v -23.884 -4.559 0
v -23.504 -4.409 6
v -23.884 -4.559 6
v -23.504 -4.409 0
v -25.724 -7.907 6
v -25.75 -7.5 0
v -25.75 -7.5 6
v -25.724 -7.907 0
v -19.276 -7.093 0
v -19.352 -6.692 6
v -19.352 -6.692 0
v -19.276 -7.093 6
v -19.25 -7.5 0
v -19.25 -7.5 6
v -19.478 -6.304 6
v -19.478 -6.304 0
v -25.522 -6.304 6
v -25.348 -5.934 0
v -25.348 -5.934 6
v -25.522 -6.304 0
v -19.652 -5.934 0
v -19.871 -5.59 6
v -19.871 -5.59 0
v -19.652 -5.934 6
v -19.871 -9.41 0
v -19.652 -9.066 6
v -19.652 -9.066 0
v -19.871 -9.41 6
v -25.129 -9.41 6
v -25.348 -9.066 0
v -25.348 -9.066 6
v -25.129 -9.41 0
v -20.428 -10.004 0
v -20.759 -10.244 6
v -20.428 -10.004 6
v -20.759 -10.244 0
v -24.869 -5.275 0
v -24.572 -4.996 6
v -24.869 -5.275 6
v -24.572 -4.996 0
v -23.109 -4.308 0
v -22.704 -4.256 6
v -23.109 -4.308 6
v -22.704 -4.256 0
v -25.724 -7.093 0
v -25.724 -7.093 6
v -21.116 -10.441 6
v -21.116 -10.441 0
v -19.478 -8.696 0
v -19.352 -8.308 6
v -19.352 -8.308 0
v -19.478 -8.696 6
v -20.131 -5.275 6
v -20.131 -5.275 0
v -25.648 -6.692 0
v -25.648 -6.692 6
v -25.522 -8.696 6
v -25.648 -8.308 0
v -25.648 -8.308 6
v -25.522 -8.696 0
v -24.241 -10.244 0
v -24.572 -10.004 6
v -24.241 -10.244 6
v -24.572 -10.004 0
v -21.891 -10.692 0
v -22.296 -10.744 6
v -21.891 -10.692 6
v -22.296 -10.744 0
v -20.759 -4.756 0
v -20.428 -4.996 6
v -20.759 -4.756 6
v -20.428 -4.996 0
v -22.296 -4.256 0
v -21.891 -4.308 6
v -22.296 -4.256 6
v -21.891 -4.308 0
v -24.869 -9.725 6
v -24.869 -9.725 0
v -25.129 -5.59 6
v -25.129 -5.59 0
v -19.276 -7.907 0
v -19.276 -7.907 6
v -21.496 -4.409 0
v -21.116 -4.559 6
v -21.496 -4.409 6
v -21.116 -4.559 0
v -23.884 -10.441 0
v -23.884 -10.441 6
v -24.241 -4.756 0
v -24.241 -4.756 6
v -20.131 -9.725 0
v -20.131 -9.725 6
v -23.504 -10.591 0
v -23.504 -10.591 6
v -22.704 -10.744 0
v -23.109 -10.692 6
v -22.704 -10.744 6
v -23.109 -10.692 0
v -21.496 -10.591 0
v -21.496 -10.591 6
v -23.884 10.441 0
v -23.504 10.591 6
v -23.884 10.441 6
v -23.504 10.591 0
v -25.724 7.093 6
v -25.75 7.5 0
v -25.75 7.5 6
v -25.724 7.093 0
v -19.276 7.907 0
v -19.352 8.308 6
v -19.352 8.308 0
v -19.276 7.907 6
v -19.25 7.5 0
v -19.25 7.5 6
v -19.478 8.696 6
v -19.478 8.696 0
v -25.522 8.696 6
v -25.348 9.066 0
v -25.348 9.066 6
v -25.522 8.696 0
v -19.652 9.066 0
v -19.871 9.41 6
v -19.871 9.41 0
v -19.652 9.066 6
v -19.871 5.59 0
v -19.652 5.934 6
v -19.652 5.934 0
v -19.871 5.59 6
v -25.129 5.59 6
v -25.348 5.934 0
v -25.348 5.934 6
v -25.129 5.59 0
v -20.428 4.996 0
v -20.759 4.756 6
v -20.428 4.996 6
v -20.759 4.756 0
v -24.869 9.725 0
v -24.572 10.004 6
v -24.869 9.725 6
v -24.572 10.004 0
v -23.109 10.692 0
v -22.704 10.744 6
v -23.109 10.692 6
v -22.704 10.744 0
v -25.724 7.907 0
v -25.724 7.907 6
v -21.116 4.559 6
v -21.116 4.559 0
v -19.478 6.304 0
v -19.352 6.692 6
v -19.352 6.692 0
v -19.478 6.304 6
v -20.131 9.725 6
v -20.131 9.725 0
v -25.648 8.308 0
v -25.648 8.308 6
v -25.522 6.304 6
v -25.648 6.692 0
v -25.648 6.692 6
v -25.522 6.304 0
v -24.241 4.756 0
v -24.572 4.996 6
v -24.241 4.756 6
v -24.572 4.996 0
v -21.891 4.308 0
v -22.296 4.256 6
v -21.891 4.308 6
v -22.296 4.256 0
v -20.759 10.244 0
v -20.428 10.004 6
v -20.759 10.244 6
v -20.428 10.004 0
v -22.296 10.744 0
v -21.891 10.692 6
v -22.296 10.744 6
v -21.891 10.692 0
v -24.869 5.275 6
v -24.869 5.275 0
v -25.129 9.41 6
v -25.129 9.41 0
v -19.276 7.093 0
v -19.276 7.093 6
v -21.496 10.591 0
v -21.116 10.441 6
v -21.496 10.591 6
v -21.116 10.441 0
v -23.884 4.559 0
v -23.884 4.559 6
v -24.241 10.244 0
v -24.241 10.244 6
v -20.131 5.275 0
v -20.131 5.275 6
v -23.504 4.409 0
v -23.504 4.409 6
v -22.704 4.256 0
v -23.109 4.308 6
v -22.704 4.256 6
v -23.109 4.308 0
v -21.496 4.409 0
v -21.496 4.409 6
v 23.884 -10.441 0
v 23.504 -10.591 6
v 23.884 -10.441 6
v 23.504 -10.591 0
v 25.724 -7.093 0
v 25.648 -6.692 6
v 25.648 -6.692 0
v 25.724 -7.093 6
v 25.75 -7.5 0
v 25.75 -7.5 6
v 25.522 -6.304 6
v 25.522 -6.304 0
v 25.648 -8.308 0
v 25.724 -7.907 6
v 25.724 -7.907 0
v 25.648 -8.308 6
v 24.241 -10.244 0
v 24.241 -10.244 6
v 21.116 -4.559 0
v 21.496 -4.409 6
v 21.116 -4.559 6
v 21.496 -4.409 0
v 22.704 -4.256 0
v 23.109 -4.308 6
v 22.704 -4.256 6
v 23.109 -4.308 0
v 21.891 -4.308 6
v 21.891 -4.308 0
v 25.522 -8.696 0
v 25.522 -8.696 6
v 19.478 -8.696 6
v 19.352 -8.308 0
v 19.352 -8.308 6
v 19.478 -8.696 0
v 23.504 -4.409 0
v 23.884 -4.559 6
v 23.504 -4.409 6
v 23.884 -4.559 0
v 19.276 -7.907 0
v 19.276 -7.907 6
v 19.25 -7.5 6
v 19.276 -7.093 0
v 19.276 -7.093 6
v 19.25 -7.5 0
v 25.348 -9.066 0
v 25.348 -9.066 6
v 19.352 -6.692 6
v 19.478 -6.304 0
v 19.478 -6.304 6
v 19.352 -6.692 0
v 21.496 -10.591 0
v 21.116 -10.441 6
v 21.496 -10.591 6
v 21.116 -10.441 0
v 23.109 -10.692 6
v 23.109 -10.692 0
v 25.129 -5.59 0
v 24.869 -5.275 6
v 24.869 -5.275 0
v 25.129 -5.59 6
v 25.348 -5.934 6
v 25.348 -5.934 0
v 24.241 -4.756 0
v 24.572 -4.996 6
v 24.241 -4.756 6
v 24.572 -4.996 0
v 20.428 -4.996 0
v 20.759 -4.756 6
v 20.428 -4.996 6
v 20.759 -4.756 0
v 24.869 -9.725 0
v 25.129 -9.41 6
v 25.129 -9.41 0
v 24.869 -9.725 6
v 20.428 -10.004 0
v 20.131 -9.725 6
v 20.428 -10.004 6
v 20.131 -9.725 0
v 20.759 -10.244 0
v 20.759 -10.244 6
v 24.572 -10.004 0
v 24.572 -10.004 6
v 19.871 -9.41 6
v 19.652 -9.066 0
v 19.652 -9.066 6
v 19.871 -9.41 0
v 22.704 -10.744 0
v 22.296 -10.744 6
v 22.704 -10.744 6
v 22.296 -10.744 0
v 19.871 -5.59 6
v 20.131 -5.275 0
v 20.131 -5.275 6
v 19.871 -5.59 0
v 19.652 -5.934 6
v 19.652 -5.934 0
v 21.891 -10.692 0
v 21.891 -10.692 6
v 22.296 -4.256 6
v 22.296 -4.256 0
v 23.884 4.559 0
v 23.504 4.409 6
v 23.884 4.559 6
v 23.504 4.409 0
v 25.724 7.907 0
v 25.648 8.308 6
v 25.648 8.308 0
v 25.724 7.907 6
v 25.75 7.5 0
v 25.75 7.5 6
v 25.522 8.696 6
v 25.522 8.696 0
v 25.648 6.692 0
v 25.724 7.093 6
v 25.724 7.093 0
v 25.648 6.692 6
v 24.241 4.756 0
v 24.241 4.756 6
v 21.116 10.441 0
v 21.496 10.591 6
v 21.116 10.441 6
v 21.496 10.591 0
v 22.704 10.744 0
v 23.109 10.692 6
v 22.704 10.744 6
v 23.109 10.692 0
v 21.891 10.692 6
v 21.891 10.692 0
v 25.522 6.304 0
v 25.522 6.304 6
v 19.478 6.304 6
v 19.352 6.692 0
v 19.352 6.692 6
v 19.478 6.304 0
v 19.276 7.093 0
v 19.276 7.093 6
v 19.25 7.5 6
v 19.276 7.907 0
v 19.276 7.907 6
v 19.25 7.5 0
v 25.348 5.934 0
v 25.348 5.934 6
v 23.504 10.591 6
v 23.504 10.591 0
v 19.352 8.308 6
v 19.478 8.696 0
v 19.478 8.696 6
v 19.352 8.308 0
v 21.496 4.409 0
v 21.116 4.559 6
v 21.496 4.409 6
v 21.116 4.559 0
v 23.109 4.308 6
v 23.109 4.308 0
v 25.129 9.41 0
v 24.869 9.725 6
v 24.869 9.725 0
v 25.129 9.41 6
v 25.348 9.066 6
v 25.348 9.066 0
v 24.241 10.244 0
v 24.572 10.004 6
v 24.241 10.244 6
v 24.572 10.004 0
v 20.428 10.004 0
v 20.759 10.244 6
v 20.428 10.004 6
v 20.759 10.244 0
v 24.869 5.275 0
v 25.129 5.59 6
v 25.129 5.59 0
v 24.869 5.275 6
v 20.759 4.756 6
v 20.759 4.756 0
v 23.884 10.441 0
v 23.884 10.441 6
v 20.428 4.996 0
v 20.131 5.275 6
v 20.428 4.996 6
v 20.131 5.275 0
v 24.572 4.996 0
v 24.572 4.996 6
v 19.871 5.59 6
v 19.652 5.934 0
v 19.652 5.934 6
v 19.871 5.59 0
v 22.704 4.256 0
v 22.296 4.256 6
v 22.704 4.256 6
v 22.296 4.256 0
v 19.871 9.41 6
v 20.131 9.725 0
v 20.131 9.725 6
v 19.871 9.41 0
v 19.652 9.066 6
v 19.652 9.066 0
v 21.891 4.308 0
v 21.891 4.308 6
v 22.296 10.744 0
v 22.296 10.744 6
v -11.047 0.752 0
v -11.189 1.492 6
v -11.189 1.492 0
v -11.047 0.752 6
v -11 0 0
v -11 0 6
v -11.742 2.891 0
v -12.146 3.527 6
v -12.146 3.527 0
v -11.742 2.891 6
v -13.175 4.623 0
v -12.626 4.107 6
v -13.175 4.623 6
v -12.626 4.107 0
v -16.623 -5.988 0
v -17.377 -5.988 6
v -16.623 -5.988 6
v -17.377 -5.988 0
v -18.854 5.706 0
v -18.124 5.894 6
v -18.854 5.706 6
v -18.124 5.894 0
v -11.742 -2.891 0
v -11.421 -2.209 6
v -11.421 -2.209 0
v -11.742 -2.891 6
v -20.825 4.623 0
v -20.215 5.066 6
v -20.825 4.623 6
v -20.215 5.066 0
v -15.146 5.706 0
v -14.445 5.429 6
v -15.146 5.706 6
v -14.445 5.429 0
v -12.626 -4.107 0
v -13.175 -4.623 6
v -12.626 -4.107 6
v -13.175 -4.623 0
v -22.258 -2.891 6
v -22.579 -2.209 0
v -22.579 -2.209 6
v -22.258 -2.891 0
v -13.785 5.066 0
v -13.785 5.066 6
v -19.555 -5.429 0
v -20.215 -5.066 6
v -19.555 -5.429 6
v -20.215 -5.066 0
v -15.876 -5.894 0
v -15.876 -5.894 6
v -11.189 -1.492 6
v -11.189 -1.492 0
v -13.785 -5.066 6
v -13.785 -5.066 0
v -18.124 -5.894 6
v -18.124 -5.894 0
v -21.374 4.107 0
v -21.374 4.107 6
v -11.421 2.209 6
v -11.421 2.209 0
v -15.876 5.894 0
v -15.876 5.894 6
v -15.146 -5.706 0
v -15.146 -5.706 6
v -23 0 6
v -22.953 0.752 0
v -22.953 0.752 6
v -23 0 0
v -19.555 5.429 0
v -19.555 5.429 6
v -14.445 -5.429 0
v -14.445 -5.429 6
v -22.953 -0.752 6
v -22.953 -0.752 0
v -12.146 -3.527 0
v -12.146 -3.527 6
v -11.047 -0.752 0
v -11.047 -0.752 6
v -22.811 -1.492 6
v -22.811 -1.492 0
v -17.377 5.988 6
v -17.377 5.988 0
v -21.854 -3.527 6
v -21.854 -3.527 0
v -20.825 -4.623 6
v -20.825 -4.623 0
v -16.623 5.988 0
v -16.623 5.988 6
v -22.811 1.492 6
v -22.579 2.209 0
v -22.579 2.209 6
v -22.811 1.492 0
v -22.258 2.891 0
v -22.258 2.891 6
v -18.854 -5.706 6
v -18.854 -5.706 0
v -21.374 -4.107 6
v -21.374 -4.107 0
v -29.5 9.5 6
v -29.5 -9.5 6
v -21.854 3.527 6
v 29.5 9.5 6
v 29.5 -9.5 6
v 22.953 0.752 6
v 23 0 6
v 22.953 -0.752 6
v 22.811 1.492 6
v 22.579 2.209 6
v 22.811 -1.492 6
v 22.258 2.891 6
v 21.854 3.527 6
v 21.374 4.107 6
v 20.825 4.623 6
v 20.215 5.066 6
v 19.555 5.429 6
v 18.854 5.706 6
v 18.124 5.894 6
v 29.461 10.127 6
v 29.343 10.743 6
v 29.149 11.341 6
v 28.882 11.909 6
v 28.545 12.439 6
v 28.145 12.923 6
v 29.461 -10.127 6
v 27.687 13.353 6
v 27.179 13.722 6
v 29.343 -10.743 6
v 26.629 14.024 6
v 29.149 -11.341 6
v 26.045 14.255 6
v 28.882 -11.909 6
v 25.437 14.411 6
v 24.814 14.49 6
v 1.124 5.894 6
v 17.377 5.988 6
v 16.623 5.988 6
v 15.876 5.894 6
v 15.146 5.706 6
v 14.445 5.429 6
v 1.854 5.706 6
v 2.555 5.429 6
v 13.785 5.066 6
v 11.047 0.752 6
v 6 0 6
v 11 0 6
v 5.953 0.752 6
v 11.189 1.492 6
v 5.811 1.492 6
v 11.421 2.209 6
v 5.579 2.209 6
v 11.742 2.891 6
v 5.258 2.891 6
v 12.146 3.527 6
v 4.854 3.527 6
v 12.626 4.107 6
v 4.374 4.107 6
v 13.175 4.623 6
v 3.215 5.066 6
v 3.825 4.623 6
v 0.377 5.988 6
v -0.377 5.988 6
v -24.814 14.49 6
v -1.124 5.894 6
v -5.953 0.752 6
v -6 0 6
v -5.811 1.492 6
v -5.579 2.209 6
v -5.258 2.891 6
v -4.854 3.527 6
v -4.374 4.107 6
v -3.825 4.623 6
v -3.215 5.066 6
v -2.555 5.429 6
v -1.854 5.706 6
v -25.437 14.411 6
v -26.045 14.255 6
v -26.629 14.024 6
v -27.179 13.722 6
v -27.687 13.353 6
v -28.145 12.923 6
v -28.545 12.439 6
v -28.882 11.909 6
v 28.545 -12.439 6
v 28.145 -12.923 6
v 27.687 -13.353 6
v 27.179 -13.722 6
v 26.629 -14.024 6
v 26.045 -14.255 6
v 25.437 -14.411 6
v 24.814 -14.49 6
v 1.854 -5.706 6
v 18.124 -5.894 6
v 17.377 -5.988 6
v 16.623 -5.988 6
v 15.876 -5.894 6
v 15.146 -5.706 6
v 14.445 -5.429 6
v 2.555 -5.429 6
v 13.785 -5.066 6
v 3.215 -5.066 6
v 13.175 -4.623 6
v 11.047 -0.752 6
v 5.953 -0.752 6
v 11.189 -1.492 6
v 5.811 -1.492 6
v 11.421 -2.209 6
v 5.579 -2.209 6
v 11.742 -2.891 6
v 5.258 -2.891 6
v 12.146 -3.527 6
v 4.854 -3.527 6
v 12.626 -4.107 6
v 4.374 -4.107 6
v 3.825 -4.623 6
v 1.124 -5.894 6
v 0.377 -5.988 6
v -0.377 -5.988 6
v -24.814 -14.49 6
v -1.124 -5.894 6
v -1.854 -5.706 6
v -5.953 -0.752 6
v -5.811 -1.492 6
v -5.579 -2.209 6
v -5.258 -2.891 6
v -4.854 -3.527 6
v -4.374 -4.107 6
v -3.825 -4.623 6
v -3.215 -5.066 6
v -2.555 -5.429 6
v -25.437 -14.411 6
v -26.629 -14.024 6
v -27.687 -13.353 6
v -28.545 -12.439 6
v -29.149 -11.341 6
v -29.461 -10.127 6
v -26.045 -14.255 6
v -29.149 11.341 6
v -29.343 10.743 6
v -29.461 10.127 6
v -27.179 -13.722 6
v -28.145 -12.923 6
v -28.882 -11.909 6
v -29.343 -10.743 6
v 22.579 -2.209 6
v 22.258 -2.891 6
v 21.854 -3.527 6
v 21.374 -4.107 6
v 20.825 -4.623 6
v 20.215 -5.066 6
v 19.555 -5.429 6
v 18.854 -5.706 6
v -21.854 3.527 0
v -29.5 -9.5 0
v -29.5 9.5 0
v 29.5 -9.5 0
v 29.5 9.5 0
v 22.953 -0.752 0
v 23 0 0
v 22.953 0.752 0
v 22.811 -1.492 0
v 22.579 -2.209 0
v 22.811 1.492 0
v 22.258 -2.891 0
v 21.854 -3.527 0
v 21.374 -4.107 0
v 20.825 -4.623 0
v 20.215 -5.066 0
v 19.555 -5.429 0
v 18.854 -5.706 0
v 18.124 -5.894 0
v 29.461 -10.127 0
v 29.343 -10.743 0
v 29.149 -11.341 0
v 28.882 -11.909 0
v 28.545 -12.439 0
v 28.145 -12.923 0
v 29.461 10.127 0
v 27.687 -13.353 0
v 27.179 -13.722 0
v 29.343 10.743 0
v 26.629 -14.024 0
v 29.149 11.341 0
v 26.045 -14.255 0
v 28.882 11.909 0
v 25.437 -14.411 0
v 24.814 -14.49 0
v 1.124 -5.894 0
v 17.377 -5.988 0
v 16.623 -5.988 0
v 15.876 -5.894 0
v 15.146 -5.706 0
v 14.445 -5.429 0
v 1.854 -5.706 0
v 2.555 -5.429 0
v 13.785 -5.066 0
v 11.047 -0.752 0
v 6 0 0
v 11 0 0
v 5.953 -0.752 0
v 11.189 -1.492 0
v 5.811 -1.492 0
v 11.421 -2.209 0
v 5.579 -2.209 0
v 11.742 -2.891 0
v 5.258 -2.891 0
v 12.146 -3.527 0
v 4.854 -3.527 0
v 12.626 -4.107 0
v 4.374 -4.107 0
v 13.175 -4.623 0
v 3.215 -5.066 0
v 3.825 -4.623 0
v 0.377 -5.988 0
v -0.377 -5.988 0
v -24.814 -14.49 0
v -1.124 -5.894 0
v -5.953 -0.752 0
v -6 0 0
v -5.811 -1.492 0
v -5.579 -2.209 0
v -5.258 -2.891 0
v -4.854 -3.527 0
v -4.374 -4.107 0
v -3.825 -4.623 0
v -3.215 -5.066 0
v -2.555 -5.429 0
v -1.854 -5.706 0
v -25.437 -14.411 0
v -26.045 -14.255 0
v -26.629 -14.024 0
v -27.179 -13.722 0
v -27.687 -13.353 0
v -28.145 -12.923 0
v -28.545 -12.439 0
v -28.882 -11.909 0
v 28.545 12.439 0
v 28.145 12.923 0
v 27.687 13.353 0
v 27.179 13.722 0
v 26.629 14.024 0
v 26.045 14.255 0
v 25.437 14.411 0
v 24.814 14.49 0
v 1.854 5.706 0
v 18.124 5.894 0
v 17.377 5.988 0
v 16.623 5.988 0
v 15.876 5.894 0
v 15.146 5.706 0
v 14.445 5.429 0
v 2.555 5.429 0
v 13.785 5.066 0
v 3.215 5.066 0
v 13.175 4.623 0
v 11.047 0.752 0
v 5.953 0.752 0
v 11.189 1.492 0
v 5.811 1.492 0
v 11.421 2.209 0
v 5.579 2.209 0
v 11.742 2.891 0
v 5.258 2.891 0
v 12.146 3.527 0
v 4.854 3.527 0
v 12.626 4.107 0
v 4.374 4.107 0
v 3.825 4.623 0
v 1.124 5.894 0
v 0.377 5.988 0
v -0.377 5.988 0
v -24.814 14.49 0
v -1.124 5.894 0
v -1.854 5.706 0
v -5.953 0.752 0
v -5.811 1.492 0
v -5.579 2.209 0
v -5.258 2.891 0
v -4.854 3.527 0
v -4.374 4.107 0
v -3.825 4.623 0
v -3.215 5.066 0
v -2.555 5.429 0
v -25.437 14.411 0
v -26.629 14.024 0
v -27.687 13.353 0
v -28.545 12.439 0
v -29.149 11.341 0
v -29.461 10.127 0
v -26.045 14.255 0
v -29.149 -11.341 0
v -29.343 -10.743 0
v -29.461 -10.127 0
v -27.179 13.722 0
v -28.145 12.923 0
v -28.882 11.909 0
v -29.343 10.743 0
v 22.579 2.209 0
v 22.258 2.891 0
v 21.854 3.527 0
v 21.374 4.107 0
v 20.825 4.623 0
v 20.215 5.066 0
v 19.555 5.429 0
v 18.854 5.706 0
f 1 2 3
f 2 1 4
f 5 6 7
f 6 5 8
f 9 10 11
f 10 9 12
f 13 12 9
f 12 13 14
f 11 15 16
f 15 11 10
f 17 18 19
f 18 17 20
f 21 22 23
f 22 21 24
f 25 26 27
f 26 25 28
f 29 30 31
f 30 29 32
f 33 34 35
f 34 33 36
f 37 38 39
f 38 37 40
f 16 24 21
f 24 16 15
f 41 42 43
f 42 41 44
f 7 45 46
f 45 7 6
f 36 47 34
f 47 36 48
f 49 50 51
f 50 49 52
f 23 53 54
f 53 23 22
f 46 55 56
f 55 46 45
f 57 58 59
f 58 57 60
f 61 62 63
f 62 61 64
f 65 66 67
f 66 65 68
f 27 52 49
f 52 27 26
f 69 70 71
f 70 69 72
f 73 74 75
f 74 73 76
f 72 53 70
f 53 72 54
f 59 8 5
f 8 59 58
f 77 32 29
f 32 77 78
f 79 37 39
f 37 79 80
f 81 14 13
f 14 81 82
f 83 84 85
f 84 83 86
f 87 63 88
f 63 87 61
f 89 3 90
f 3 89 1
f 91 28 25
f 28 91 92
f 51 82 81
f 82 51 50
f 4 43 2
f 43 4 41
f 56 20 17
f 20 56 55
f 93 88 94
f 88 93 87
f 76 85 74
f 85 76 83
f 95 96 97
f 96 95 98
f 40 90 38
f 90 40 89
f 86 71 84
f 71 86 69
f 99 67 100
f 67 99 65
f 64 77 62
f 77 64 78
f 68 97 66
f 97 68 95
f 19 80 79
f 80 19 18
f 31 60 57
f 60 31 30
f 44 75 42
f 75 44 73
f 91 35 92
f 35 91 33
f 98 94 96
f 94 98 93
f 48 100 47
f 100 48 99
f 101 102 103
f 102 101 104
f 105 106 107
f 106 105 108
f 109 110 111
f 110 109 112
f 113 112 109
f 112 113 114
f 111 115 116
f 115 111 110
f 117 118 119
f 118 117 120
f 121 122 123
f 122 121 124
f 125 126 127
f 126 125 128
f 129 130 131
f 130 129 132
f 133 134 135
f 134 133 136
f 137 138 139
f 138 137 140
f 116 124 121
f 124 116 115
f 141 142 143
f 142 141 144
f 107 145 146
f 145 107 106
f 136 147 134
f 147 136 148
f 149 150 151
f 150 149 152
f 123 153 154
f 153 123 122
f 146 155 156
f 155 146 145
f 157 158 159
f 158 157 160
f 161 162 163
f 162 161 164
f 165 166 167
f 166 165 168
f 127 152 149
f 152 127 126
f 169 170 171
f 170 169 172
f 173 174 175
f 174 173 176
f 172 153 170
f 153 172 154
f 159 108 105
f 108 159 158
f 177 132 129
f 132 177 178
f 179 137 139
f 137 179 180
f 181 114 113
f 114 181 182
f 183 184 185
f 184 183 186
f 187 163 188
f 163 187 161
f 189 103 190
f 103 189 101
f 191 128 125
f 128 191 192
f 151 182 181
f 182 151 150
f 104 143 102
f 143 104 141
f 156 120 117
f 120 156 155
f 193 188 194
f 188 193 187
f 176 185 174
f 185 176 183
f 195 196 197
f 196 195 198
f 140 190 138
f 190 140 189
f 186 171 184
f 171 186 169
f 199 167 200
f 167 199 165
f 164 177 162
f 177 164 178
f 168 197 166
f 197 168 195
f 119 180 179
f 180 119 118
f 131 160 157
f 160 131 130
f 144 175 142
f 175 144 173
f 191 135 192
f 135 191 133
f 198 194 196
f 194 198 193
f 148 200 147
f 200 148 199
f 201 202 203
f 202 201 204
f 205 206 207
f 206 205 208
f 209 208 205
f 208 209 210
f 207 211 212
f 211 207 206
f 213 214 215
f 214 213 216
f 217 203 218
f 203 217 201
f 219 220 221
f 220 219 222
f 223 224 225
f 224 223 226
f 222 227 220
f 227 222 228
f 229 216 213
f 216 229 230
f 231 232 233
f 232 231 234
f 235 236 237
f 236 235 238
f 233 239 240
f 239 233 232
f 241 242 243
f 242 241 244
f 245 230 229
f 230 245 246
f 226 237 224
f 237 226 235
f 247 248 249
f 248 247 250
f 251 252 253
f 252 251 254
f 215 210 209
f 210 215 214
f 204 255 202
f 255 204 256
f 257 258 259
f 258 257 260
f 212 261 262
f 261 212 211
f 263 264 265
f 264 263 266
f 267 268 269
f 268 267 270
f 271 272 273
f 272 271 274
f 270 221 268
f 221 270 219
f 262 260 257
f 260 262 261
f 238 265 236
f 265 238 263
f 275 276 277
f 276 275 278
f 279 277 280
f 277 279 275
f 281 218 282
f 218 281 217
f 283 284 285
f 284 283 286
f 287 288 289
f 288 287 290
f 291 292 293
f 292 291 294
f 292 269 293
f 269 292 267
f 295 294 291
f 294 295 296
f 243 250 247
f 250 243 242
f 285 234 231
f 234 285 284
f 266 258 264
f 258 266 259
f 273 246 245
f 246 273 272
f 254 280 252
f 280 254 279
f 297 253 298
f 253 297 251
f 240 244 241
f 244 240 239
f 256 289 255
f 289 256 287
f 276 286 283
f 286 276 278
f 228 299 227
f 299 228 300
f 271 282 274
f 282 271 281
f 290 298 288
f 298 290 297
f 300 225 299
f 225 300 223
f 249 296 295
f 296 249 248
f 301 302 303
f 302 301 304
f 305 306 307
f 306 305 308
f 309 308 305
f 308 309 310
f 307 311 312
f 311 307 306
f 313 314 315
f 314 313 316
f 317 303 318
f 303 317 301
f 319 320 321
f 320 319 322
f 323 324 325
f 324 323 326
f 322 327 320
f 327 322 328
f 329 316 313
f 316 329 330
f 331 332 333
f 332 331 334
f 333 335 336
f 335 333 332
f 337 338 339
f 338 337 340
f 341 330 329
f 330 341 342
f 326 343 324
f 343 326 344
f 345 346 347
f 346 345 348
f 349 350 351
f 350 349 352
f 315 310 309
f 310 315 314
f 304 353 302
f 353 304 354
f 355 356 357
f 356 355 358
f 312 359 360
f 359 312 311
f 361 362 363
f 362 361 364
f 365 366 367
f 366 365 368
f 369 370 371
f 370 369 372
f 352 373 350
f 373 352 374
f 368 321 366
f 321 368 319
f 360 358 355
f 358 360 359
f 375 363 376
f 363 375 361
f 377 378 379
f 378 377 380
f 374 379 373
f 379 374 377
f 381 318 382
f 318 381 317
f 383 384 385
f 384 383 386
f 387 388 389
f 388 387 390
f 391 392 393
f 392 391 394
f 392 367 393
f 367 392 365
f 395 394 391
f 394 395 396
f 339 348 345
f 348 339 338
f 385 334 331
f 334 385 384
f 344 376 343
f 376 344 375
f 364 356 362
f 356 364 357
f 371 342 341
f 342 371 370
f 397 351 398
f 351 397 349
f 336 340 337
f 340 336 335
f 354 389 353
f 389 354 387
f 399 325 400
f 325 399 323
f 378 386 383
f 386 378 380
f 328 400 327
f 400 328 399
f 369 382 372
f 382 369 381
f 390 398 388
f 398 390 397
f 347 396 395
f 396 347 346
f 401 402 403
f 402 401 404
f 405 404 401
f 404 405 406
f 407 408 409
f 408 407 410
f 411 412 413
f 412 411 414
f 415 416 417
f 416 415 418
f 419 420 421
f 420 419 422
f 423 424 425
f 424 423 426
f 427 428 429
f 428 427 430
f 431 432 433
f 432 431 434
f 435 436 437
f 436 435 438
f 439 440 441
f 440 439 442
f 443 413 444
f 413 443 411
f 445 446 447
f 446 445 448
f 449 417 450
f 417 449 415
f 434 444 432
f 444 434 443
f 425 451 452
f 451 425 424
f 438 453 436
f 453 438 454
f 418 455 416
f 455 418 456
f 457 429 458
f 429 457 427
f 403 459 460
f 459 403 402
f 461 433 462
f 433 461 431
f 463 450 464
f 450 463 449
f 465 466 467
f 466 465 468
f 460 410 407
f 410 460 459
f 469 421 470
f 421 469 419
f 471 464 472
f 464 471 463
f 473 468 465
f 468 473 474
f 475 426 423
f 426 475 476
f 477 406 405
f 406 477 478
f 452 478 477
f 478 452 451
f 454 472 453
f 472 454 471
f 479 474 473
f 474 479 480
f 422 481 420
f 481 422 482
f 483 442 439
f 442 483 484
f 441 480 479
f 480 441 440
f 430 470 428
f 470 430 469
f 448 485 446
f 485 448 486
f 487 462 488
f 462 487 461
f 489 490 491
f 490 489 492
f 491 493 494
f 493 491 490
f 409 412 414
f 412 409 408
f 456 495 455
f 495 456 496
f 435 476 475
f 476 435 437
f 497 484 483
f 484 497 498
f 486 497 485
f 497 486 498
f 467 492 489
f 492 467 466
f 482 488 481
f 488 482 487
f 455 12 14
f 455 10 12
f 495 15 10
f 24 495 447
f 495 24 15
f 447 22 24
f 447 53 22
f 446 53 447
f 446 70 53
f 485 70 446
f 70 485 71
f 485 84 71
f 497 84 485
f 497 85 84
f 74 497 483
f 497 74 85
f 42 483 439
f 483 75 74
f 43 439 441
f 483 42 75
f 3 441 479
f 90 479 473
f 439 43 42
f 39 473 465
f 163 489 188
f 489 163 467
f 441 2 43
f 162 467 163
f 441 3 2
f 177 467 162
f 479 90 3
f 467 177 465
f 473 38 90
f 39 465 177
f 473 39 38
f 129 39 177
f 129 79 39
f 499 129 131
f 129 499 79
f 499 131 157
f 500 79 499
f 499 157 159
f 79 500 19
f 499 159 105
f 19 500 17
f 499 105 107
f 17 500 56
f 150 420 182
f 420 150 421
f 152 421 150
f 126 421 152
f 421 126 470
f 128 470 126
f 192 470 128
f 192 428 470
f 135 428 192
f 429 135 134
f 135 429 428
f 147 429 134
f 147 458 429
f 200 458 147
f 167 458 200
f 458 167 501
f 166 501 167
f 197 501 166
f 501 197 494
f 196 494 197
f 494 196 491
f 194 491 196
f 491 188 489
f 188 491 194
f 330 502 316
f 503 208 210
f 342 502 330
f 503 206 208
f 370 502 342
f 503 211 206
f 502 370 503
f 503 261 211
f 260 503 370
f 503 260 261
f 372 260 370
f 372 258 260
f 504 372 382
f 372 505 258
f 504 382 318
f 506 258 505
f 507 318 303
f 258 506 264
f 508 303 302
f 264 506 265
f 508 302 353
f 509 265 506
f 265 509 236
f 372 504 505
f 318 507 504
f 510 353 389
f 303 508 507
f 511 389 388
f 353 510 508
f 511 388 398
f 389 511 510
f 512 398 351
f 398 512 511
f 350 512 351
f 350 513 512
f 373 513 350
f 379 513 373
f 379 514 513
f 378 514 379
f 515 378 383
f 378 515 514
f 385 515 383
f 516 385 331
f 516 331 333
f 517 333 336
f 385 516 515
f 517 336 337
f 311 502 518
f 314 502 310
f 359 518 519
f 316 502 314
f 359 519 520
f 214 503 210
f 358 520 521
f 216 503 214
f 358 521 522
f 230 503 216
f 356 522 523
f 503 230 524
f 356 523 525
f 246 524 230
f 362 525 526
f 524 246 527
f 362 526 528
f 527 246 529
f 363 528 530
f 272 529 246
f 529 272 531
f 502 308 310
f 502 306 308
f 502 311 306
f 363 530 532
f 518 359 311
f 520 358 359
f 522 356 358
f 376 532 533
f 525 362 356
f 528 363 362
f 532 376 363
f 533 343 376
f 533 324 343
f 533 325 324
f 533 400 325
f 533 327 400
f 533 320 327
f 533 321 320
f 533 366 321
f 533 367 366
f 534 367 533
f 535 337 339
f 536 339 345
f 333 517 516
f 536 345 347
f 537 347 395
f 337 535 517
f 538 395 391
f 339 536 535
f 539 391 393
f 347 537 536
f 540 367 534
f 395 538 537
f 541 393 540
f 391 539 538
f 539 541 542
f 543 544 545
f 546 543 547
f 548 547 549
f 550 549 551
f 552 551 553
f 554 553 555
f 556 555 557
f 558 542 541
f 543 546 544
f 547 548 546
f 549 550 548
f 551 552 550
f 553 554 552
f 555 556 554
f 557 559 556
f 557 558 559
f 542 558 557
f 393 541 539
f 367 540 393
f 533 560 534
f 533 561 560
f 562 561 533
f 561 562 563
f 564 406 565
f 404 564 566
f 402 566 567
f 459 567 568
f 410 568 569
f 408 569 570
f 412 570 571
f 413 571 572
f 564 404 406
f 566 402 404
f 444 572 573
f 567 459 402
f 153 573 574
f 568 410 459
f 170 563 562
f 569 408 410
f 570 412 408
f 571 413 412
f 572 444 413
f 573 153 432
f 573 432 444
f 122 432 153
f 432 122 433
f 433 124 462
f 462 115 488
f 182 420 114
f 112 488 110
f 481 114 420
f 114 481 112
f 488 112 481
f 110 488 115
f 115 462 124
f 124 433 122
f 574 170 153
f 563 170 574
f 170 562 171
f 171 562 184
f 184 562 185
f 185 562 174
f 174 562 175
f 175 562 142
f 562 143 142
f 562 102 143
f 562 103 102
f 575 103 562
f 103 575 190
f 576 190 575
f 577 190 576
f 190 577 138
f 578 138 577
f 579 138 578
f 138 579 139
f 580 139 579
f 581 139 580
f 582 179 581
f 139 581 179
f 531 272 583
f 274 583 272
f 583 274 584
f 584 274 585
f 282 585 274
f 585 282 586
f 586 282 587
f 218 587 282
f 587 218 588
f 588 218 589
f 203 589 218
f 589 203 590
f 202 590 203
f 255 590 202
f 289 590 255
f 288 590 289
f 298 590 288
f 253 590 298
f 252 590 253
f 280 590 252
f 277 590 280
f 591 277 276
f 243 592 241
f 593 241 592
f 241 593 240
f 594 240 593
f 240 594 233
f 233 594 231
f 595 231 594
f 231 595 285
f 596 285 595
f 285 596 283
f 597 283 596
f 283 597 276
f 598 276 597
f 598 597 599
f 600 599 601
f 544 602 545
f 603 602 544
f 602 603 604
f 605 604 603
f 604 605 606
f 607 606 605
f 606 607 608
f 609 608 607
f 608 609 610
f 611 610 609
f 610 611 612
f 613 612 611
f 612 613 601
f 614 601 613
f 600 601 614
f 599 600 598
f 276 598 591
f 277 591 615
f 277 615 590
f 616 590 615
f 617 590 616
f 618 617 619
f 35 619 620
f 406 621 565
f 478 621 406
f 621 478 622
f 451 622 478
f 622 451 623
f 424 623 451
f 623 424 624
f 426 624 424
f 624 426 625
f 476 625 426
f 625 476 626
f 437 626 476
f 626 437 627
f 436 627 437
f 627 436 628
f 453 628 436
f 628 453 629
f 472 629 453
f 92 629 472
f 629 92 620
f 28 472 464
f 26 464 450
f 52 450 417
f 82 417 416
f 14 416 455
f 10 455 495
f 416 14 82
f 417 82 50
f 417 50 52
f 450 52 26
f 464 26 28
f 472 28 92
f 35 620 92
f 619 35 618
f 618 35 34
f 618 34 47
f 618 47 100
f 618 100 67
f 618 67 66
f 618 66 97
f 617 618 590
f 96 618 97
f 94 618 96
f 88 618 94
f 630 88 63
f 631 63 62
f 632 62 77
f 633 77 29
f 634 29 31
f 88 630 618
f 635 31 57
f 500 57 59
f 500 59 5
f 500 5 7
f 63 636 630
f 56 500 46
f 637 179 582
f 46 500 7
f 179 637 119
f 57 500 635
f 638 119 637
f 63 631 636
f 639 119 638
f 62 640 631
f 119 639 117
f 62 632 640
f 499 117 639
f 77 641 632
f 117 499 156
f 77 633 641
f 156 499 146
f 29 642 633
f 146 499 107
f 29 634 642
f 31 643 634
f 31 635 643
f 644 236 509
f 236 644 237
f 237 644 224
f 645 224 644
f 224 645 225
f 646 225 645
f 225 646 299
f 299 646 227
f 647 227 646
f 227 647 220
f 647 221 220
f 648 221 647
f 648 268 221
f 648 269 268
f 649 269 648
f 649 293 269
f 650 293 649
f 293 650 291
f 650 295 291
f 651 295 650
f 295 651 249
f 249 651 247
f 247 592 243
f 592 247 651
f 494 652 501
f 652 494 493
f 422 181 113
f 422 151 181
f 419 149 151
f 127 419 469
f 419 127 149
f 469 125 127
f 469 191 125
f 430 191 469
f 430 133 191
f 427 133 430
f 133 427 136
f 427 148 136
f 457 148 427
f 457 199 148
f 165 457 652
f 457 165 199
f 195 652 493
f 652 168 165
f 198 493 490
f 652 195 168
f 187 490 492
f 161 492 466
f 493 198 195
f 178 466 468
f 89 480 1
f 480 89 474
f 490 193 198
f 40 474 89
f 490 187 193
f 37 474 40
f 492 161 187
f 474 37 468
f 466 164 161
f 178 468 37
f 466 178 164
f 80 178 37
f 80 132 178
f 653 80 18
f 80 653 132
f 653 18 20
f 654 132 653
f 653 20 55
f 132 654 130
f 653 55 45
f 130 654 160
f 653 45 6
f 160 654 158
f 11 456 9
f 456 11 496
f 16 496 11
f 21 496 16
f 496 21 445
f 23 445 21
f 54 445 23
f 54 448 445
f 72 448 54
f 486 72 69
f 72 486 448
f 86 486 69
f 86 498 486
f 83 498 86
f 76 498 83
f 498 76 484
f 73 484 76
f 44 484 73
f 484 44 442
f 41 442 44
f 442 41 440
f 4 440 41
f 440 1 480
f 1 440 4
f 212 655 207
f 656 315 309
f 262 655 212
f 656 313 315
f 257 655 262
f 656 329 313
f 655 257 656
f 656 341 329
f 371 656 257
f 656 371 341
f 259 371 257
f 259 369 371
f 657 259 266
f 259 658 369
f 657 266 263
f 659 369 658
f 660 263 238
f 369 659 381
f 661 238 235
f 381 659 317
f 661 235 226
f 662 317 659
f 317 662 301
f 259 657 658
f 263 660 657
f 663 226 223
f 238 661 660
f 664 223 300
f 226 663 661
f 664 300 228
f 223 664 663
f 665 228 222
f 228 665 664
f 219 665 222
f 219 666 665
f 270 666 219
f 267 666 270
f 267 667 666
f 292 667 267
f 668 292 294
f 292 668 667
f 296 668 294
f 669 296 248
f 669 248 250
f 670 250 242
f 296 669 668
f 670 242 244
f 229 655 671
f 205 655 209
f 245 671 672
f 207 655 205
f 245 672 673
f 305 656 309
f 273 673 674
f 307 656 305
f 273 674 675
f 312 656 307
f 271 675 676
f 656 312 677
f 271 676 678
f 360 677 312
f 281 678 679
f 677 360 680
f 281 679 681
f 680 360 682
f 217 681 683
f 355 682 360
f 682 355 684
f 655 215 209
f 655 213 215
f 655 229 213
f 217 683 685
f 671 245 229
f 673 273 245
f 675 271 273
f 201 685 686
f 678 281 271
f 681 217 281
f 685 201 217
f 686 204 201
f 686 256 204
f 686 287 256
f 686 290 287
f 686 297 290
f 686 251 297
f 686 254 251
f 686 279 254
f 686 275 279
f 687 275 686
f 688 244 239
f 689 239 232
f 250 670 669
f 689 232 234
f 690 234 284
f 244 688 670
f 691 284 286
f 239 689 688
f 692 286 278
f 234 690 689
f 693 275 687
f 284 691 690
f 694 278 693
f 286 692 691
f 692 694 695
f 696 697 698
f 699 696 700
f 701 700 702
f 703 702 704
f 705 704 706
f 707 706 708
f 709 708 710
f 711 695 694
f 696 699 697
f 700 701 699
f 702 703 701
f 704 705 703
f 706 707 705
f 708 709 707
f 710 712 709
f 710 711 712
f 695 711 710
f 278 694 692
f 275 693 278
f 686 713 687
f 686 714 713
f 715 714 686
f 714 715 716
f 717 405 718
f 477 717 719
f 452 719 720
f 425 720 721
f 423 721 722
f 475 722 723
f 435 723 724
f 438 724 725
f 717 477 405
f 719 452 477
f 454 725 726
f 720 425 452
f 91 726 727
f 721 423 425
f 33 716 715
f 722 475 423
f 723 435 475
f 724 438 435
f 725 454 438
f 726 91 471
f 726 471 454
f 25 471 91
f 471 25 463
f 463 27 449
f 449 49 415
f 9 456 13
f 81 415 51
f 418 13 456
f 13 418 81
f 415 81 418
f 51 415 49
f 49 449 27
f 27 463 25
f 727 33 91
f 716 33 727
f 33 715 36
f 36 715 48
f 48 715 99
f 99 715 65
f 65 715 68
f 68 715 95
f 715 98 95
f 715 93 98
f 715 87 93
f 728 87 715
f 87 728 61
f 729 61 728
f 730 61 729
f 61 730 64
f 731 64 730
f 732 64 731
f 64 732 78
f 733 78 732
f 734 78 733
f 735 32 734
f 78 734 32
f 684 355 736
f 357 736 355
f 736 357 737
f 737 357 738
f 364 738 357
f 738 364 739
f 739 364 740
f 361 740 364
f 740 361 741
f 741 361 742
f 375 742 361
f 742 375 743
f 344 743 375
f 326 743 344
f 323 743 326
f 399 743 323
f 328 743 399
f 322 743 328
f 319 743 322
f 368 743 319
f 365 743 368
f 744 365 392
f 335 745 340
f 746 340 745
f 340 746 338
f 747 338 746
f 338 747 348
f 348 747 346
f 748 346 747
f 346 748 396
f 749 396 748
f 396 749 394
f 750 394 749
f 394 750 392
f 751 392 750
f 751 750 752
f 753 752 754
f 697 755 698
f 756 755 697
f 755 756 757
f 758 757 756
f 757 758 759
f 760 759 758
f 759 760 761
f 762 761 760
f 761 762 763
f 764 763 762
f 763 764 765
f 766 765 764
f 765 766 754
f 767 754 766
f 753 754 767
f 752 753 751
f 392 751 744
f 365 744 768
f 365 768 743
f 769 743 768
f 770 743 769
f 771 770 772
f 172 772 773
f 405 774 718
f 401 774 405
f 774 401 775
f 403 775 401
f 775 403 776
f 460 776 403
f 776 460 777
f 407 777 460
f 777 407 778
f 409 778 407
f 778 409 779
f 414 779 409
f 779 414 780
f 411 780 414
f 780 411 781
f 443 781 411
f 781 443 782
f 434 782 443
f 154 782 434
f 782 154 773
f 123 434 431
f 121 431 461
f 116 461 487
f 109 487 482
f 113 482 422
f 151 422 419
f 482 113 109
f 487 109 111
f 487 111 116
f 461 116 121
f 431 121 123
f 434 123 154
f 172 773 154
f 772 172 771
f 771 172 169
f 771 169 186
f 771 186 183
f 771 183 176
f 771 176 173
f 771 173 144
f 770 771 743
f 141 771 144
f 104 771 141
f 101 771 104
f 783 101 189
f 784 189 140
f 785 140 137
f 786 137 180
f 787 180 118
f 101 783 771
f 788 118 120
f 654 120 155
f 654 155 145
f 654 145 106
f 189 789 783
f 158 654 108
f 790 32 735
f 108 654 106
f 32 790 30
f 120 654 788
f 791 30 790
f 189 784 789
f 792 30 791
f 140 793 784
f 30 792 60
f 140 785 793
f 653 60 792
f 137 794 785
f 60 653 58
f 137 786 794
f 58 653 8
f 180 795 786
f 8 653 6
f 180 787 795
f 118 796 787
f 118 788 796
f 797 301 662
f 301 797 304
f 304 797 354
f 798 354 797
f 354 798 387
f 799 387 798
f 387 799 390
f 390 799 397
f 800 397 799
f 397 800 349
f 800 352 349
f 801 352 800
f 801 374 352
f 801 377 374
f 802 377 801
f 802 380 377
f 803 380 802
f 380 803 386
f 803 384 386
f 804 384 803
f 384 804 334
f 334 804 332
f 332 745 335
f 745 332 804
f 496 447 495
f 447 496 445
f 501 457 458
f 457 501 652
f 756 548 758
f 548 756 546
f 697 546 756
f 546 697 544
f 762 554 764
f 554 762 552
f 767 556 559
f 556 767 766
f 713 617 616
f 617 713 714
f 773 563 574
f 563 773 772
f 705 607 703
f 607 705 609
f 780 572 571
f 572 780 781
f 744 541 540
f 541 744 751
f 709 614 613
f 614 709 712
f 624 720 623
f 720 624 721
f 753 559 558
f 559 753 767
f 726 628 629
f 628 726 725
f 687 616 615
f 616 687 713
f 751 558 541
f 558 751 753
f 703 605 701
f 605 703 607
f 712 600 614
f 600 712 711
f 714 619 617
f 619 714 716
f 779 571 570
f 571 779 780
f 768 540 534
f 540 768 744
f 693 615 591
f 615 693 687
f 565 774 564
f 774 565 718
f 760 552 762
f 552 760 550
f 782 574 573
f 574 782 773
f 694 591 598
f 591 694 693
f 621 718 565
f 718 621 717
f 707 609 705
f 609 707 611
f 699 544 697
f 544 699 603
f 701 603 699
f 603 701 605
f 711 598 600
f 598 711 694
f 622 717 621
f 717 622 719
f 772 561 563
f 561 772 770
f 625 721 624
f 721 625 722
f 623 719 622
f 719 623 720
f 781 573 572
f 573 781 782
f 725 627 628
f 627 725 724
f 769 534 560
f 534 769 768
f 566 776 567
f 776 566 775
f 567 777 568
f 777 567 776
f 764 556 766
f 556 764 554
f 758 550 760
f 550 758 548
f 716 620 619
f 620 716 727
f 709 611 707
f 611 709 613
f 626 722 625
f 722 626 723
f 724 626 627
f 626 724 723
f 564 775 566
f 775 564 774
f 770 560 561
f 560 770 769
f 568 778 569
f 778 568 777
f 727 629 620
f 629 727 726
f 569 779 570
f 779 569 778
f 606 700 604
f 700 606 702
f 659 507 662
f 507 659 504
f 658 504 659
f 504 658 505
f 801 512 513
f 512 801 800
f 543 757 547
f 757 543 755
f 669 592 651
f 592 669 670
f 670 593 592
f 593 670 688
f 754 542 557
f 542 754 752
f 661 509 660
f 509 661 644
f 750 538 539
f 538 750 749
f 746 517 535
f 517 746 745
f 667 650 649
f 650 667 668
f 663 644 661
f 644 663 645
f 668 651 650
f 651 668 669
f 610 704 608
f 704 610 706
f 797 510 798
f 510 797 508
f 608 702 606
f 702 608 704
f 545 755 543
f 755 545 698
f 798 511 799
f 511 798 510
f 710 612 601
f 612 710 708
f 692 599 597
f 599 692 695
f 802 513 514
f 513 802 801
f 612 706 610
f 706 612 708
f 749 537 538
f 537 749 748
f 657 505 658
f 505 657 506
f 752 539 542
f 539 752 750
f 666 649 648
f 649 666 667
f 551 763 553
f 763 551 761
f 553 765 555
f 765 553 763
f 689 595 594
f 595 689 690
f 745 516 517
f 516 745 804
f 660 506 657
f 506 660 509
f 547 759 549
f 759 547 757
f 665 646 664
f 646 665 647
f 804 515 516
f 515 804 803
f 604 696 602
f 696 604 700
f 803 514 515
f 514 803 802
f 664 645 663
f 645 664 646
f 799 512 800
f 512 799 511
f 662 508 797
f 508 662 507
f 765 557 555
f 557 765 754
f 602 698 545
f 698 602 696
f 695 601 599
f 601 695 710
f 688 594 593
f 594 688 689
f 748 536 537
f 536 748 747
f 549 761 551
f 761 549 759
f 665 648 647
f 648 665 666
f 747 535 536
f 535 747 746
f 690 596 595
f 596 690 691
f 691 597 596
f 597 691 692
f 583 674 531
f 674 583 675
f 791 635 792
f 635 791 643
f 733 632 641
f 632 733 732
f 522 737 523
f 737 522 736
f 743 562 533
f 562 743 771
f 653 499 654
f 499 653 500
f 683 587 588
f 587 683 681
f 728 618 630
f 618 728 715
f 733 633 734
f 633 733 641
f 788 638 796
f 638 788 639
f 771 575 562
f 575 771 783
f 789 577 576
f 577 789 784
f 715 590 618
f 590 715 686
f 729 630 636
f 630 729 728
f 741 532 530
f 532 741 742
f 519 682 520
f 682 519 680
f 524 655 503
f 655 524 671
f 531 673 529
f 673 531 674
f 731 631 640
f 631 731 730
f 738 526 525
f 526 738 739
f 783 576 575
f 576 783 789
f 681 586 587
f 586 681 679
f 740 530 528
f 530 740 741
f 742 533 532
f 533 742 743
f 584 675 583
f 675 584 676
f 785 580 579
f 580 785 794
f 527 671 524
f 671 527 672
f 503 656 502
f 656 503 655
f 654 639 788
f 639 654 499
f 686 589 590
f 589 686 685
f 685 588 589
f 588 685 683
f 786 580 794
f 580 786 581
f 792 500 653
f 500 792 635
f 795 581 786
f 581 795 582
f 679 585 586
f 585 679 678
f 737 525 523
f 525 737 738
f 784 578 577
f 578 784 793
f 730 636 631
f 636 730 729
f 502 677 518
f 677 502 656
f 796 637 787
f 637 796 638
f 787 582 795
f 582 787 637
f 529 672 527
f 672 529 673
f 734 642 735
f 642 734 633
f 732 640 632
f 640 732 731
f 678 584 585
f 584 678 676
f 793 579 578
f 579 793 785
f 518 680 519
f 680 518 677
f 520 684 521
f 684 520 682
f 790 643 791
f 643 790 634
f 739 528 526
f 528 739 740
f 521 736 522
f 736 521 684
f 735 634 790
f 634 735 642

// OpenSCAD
$fn = 50;

difference() {
	union() {
		hull() {
			translate(v = [-24.5, 9.5, 0]) {
				cylinder(h = 6, r = 5);
			}
			translate(v = [24.5, 9.5, 0]) {
				cylinder(h = 6, r = 5);
			}
			translate(v = [-24.5, -9.5, 0]) {
				cylinder(h = 6, r = 5);
			}
			translate(v = [24.5, -9.5, 0]) {
				cylinder(h = 6, r = 5);
			}
		}
	}
	union() {
		translate(v = [-22.5, -7.5, -100.0]) {
			cylinder(h = 200, r = 3.25);
		}
		translate(v = [-22.5, 7.5, -100.0]) {
			cylinder(h = 200, r = 3.25);
		}
		translate(v = [22.5, -7.5, -100.0]) {
			cylinder(h = 200, r = 3.25);
		}
		translate(v = [22.5, 7.5, -100.0]) {
			cylinder(h = 200, r = 3.25);
		}
		translate(v = [-22.5, -7.5, -100.0]) {
			cylinder(h = 200, r = 1.8);
		}
		translate(v = [-22.5, 7.5, -100.0]) {
			cylinder(h = 200, r = 1.8);
		}
		translate(v = [22.5, -7.5, -100.0]) {
			cylinder(h = 200, r = 1.8);
		}
		translate(v = [22.5, 7.5, -100.0]) {
			cylinder(h = 200, r = 1.8);
		}
		translate(v = [-17.0, 0, 0.0]) {
			cylinder(h = 6, r = 6.0);
		}
		cylinder(h = 6, r = 6.0);
		translate(v = [17.0, 0, 0.0]) {
			cylinder(h = 6, r = 6.0);
		}
	}
}
